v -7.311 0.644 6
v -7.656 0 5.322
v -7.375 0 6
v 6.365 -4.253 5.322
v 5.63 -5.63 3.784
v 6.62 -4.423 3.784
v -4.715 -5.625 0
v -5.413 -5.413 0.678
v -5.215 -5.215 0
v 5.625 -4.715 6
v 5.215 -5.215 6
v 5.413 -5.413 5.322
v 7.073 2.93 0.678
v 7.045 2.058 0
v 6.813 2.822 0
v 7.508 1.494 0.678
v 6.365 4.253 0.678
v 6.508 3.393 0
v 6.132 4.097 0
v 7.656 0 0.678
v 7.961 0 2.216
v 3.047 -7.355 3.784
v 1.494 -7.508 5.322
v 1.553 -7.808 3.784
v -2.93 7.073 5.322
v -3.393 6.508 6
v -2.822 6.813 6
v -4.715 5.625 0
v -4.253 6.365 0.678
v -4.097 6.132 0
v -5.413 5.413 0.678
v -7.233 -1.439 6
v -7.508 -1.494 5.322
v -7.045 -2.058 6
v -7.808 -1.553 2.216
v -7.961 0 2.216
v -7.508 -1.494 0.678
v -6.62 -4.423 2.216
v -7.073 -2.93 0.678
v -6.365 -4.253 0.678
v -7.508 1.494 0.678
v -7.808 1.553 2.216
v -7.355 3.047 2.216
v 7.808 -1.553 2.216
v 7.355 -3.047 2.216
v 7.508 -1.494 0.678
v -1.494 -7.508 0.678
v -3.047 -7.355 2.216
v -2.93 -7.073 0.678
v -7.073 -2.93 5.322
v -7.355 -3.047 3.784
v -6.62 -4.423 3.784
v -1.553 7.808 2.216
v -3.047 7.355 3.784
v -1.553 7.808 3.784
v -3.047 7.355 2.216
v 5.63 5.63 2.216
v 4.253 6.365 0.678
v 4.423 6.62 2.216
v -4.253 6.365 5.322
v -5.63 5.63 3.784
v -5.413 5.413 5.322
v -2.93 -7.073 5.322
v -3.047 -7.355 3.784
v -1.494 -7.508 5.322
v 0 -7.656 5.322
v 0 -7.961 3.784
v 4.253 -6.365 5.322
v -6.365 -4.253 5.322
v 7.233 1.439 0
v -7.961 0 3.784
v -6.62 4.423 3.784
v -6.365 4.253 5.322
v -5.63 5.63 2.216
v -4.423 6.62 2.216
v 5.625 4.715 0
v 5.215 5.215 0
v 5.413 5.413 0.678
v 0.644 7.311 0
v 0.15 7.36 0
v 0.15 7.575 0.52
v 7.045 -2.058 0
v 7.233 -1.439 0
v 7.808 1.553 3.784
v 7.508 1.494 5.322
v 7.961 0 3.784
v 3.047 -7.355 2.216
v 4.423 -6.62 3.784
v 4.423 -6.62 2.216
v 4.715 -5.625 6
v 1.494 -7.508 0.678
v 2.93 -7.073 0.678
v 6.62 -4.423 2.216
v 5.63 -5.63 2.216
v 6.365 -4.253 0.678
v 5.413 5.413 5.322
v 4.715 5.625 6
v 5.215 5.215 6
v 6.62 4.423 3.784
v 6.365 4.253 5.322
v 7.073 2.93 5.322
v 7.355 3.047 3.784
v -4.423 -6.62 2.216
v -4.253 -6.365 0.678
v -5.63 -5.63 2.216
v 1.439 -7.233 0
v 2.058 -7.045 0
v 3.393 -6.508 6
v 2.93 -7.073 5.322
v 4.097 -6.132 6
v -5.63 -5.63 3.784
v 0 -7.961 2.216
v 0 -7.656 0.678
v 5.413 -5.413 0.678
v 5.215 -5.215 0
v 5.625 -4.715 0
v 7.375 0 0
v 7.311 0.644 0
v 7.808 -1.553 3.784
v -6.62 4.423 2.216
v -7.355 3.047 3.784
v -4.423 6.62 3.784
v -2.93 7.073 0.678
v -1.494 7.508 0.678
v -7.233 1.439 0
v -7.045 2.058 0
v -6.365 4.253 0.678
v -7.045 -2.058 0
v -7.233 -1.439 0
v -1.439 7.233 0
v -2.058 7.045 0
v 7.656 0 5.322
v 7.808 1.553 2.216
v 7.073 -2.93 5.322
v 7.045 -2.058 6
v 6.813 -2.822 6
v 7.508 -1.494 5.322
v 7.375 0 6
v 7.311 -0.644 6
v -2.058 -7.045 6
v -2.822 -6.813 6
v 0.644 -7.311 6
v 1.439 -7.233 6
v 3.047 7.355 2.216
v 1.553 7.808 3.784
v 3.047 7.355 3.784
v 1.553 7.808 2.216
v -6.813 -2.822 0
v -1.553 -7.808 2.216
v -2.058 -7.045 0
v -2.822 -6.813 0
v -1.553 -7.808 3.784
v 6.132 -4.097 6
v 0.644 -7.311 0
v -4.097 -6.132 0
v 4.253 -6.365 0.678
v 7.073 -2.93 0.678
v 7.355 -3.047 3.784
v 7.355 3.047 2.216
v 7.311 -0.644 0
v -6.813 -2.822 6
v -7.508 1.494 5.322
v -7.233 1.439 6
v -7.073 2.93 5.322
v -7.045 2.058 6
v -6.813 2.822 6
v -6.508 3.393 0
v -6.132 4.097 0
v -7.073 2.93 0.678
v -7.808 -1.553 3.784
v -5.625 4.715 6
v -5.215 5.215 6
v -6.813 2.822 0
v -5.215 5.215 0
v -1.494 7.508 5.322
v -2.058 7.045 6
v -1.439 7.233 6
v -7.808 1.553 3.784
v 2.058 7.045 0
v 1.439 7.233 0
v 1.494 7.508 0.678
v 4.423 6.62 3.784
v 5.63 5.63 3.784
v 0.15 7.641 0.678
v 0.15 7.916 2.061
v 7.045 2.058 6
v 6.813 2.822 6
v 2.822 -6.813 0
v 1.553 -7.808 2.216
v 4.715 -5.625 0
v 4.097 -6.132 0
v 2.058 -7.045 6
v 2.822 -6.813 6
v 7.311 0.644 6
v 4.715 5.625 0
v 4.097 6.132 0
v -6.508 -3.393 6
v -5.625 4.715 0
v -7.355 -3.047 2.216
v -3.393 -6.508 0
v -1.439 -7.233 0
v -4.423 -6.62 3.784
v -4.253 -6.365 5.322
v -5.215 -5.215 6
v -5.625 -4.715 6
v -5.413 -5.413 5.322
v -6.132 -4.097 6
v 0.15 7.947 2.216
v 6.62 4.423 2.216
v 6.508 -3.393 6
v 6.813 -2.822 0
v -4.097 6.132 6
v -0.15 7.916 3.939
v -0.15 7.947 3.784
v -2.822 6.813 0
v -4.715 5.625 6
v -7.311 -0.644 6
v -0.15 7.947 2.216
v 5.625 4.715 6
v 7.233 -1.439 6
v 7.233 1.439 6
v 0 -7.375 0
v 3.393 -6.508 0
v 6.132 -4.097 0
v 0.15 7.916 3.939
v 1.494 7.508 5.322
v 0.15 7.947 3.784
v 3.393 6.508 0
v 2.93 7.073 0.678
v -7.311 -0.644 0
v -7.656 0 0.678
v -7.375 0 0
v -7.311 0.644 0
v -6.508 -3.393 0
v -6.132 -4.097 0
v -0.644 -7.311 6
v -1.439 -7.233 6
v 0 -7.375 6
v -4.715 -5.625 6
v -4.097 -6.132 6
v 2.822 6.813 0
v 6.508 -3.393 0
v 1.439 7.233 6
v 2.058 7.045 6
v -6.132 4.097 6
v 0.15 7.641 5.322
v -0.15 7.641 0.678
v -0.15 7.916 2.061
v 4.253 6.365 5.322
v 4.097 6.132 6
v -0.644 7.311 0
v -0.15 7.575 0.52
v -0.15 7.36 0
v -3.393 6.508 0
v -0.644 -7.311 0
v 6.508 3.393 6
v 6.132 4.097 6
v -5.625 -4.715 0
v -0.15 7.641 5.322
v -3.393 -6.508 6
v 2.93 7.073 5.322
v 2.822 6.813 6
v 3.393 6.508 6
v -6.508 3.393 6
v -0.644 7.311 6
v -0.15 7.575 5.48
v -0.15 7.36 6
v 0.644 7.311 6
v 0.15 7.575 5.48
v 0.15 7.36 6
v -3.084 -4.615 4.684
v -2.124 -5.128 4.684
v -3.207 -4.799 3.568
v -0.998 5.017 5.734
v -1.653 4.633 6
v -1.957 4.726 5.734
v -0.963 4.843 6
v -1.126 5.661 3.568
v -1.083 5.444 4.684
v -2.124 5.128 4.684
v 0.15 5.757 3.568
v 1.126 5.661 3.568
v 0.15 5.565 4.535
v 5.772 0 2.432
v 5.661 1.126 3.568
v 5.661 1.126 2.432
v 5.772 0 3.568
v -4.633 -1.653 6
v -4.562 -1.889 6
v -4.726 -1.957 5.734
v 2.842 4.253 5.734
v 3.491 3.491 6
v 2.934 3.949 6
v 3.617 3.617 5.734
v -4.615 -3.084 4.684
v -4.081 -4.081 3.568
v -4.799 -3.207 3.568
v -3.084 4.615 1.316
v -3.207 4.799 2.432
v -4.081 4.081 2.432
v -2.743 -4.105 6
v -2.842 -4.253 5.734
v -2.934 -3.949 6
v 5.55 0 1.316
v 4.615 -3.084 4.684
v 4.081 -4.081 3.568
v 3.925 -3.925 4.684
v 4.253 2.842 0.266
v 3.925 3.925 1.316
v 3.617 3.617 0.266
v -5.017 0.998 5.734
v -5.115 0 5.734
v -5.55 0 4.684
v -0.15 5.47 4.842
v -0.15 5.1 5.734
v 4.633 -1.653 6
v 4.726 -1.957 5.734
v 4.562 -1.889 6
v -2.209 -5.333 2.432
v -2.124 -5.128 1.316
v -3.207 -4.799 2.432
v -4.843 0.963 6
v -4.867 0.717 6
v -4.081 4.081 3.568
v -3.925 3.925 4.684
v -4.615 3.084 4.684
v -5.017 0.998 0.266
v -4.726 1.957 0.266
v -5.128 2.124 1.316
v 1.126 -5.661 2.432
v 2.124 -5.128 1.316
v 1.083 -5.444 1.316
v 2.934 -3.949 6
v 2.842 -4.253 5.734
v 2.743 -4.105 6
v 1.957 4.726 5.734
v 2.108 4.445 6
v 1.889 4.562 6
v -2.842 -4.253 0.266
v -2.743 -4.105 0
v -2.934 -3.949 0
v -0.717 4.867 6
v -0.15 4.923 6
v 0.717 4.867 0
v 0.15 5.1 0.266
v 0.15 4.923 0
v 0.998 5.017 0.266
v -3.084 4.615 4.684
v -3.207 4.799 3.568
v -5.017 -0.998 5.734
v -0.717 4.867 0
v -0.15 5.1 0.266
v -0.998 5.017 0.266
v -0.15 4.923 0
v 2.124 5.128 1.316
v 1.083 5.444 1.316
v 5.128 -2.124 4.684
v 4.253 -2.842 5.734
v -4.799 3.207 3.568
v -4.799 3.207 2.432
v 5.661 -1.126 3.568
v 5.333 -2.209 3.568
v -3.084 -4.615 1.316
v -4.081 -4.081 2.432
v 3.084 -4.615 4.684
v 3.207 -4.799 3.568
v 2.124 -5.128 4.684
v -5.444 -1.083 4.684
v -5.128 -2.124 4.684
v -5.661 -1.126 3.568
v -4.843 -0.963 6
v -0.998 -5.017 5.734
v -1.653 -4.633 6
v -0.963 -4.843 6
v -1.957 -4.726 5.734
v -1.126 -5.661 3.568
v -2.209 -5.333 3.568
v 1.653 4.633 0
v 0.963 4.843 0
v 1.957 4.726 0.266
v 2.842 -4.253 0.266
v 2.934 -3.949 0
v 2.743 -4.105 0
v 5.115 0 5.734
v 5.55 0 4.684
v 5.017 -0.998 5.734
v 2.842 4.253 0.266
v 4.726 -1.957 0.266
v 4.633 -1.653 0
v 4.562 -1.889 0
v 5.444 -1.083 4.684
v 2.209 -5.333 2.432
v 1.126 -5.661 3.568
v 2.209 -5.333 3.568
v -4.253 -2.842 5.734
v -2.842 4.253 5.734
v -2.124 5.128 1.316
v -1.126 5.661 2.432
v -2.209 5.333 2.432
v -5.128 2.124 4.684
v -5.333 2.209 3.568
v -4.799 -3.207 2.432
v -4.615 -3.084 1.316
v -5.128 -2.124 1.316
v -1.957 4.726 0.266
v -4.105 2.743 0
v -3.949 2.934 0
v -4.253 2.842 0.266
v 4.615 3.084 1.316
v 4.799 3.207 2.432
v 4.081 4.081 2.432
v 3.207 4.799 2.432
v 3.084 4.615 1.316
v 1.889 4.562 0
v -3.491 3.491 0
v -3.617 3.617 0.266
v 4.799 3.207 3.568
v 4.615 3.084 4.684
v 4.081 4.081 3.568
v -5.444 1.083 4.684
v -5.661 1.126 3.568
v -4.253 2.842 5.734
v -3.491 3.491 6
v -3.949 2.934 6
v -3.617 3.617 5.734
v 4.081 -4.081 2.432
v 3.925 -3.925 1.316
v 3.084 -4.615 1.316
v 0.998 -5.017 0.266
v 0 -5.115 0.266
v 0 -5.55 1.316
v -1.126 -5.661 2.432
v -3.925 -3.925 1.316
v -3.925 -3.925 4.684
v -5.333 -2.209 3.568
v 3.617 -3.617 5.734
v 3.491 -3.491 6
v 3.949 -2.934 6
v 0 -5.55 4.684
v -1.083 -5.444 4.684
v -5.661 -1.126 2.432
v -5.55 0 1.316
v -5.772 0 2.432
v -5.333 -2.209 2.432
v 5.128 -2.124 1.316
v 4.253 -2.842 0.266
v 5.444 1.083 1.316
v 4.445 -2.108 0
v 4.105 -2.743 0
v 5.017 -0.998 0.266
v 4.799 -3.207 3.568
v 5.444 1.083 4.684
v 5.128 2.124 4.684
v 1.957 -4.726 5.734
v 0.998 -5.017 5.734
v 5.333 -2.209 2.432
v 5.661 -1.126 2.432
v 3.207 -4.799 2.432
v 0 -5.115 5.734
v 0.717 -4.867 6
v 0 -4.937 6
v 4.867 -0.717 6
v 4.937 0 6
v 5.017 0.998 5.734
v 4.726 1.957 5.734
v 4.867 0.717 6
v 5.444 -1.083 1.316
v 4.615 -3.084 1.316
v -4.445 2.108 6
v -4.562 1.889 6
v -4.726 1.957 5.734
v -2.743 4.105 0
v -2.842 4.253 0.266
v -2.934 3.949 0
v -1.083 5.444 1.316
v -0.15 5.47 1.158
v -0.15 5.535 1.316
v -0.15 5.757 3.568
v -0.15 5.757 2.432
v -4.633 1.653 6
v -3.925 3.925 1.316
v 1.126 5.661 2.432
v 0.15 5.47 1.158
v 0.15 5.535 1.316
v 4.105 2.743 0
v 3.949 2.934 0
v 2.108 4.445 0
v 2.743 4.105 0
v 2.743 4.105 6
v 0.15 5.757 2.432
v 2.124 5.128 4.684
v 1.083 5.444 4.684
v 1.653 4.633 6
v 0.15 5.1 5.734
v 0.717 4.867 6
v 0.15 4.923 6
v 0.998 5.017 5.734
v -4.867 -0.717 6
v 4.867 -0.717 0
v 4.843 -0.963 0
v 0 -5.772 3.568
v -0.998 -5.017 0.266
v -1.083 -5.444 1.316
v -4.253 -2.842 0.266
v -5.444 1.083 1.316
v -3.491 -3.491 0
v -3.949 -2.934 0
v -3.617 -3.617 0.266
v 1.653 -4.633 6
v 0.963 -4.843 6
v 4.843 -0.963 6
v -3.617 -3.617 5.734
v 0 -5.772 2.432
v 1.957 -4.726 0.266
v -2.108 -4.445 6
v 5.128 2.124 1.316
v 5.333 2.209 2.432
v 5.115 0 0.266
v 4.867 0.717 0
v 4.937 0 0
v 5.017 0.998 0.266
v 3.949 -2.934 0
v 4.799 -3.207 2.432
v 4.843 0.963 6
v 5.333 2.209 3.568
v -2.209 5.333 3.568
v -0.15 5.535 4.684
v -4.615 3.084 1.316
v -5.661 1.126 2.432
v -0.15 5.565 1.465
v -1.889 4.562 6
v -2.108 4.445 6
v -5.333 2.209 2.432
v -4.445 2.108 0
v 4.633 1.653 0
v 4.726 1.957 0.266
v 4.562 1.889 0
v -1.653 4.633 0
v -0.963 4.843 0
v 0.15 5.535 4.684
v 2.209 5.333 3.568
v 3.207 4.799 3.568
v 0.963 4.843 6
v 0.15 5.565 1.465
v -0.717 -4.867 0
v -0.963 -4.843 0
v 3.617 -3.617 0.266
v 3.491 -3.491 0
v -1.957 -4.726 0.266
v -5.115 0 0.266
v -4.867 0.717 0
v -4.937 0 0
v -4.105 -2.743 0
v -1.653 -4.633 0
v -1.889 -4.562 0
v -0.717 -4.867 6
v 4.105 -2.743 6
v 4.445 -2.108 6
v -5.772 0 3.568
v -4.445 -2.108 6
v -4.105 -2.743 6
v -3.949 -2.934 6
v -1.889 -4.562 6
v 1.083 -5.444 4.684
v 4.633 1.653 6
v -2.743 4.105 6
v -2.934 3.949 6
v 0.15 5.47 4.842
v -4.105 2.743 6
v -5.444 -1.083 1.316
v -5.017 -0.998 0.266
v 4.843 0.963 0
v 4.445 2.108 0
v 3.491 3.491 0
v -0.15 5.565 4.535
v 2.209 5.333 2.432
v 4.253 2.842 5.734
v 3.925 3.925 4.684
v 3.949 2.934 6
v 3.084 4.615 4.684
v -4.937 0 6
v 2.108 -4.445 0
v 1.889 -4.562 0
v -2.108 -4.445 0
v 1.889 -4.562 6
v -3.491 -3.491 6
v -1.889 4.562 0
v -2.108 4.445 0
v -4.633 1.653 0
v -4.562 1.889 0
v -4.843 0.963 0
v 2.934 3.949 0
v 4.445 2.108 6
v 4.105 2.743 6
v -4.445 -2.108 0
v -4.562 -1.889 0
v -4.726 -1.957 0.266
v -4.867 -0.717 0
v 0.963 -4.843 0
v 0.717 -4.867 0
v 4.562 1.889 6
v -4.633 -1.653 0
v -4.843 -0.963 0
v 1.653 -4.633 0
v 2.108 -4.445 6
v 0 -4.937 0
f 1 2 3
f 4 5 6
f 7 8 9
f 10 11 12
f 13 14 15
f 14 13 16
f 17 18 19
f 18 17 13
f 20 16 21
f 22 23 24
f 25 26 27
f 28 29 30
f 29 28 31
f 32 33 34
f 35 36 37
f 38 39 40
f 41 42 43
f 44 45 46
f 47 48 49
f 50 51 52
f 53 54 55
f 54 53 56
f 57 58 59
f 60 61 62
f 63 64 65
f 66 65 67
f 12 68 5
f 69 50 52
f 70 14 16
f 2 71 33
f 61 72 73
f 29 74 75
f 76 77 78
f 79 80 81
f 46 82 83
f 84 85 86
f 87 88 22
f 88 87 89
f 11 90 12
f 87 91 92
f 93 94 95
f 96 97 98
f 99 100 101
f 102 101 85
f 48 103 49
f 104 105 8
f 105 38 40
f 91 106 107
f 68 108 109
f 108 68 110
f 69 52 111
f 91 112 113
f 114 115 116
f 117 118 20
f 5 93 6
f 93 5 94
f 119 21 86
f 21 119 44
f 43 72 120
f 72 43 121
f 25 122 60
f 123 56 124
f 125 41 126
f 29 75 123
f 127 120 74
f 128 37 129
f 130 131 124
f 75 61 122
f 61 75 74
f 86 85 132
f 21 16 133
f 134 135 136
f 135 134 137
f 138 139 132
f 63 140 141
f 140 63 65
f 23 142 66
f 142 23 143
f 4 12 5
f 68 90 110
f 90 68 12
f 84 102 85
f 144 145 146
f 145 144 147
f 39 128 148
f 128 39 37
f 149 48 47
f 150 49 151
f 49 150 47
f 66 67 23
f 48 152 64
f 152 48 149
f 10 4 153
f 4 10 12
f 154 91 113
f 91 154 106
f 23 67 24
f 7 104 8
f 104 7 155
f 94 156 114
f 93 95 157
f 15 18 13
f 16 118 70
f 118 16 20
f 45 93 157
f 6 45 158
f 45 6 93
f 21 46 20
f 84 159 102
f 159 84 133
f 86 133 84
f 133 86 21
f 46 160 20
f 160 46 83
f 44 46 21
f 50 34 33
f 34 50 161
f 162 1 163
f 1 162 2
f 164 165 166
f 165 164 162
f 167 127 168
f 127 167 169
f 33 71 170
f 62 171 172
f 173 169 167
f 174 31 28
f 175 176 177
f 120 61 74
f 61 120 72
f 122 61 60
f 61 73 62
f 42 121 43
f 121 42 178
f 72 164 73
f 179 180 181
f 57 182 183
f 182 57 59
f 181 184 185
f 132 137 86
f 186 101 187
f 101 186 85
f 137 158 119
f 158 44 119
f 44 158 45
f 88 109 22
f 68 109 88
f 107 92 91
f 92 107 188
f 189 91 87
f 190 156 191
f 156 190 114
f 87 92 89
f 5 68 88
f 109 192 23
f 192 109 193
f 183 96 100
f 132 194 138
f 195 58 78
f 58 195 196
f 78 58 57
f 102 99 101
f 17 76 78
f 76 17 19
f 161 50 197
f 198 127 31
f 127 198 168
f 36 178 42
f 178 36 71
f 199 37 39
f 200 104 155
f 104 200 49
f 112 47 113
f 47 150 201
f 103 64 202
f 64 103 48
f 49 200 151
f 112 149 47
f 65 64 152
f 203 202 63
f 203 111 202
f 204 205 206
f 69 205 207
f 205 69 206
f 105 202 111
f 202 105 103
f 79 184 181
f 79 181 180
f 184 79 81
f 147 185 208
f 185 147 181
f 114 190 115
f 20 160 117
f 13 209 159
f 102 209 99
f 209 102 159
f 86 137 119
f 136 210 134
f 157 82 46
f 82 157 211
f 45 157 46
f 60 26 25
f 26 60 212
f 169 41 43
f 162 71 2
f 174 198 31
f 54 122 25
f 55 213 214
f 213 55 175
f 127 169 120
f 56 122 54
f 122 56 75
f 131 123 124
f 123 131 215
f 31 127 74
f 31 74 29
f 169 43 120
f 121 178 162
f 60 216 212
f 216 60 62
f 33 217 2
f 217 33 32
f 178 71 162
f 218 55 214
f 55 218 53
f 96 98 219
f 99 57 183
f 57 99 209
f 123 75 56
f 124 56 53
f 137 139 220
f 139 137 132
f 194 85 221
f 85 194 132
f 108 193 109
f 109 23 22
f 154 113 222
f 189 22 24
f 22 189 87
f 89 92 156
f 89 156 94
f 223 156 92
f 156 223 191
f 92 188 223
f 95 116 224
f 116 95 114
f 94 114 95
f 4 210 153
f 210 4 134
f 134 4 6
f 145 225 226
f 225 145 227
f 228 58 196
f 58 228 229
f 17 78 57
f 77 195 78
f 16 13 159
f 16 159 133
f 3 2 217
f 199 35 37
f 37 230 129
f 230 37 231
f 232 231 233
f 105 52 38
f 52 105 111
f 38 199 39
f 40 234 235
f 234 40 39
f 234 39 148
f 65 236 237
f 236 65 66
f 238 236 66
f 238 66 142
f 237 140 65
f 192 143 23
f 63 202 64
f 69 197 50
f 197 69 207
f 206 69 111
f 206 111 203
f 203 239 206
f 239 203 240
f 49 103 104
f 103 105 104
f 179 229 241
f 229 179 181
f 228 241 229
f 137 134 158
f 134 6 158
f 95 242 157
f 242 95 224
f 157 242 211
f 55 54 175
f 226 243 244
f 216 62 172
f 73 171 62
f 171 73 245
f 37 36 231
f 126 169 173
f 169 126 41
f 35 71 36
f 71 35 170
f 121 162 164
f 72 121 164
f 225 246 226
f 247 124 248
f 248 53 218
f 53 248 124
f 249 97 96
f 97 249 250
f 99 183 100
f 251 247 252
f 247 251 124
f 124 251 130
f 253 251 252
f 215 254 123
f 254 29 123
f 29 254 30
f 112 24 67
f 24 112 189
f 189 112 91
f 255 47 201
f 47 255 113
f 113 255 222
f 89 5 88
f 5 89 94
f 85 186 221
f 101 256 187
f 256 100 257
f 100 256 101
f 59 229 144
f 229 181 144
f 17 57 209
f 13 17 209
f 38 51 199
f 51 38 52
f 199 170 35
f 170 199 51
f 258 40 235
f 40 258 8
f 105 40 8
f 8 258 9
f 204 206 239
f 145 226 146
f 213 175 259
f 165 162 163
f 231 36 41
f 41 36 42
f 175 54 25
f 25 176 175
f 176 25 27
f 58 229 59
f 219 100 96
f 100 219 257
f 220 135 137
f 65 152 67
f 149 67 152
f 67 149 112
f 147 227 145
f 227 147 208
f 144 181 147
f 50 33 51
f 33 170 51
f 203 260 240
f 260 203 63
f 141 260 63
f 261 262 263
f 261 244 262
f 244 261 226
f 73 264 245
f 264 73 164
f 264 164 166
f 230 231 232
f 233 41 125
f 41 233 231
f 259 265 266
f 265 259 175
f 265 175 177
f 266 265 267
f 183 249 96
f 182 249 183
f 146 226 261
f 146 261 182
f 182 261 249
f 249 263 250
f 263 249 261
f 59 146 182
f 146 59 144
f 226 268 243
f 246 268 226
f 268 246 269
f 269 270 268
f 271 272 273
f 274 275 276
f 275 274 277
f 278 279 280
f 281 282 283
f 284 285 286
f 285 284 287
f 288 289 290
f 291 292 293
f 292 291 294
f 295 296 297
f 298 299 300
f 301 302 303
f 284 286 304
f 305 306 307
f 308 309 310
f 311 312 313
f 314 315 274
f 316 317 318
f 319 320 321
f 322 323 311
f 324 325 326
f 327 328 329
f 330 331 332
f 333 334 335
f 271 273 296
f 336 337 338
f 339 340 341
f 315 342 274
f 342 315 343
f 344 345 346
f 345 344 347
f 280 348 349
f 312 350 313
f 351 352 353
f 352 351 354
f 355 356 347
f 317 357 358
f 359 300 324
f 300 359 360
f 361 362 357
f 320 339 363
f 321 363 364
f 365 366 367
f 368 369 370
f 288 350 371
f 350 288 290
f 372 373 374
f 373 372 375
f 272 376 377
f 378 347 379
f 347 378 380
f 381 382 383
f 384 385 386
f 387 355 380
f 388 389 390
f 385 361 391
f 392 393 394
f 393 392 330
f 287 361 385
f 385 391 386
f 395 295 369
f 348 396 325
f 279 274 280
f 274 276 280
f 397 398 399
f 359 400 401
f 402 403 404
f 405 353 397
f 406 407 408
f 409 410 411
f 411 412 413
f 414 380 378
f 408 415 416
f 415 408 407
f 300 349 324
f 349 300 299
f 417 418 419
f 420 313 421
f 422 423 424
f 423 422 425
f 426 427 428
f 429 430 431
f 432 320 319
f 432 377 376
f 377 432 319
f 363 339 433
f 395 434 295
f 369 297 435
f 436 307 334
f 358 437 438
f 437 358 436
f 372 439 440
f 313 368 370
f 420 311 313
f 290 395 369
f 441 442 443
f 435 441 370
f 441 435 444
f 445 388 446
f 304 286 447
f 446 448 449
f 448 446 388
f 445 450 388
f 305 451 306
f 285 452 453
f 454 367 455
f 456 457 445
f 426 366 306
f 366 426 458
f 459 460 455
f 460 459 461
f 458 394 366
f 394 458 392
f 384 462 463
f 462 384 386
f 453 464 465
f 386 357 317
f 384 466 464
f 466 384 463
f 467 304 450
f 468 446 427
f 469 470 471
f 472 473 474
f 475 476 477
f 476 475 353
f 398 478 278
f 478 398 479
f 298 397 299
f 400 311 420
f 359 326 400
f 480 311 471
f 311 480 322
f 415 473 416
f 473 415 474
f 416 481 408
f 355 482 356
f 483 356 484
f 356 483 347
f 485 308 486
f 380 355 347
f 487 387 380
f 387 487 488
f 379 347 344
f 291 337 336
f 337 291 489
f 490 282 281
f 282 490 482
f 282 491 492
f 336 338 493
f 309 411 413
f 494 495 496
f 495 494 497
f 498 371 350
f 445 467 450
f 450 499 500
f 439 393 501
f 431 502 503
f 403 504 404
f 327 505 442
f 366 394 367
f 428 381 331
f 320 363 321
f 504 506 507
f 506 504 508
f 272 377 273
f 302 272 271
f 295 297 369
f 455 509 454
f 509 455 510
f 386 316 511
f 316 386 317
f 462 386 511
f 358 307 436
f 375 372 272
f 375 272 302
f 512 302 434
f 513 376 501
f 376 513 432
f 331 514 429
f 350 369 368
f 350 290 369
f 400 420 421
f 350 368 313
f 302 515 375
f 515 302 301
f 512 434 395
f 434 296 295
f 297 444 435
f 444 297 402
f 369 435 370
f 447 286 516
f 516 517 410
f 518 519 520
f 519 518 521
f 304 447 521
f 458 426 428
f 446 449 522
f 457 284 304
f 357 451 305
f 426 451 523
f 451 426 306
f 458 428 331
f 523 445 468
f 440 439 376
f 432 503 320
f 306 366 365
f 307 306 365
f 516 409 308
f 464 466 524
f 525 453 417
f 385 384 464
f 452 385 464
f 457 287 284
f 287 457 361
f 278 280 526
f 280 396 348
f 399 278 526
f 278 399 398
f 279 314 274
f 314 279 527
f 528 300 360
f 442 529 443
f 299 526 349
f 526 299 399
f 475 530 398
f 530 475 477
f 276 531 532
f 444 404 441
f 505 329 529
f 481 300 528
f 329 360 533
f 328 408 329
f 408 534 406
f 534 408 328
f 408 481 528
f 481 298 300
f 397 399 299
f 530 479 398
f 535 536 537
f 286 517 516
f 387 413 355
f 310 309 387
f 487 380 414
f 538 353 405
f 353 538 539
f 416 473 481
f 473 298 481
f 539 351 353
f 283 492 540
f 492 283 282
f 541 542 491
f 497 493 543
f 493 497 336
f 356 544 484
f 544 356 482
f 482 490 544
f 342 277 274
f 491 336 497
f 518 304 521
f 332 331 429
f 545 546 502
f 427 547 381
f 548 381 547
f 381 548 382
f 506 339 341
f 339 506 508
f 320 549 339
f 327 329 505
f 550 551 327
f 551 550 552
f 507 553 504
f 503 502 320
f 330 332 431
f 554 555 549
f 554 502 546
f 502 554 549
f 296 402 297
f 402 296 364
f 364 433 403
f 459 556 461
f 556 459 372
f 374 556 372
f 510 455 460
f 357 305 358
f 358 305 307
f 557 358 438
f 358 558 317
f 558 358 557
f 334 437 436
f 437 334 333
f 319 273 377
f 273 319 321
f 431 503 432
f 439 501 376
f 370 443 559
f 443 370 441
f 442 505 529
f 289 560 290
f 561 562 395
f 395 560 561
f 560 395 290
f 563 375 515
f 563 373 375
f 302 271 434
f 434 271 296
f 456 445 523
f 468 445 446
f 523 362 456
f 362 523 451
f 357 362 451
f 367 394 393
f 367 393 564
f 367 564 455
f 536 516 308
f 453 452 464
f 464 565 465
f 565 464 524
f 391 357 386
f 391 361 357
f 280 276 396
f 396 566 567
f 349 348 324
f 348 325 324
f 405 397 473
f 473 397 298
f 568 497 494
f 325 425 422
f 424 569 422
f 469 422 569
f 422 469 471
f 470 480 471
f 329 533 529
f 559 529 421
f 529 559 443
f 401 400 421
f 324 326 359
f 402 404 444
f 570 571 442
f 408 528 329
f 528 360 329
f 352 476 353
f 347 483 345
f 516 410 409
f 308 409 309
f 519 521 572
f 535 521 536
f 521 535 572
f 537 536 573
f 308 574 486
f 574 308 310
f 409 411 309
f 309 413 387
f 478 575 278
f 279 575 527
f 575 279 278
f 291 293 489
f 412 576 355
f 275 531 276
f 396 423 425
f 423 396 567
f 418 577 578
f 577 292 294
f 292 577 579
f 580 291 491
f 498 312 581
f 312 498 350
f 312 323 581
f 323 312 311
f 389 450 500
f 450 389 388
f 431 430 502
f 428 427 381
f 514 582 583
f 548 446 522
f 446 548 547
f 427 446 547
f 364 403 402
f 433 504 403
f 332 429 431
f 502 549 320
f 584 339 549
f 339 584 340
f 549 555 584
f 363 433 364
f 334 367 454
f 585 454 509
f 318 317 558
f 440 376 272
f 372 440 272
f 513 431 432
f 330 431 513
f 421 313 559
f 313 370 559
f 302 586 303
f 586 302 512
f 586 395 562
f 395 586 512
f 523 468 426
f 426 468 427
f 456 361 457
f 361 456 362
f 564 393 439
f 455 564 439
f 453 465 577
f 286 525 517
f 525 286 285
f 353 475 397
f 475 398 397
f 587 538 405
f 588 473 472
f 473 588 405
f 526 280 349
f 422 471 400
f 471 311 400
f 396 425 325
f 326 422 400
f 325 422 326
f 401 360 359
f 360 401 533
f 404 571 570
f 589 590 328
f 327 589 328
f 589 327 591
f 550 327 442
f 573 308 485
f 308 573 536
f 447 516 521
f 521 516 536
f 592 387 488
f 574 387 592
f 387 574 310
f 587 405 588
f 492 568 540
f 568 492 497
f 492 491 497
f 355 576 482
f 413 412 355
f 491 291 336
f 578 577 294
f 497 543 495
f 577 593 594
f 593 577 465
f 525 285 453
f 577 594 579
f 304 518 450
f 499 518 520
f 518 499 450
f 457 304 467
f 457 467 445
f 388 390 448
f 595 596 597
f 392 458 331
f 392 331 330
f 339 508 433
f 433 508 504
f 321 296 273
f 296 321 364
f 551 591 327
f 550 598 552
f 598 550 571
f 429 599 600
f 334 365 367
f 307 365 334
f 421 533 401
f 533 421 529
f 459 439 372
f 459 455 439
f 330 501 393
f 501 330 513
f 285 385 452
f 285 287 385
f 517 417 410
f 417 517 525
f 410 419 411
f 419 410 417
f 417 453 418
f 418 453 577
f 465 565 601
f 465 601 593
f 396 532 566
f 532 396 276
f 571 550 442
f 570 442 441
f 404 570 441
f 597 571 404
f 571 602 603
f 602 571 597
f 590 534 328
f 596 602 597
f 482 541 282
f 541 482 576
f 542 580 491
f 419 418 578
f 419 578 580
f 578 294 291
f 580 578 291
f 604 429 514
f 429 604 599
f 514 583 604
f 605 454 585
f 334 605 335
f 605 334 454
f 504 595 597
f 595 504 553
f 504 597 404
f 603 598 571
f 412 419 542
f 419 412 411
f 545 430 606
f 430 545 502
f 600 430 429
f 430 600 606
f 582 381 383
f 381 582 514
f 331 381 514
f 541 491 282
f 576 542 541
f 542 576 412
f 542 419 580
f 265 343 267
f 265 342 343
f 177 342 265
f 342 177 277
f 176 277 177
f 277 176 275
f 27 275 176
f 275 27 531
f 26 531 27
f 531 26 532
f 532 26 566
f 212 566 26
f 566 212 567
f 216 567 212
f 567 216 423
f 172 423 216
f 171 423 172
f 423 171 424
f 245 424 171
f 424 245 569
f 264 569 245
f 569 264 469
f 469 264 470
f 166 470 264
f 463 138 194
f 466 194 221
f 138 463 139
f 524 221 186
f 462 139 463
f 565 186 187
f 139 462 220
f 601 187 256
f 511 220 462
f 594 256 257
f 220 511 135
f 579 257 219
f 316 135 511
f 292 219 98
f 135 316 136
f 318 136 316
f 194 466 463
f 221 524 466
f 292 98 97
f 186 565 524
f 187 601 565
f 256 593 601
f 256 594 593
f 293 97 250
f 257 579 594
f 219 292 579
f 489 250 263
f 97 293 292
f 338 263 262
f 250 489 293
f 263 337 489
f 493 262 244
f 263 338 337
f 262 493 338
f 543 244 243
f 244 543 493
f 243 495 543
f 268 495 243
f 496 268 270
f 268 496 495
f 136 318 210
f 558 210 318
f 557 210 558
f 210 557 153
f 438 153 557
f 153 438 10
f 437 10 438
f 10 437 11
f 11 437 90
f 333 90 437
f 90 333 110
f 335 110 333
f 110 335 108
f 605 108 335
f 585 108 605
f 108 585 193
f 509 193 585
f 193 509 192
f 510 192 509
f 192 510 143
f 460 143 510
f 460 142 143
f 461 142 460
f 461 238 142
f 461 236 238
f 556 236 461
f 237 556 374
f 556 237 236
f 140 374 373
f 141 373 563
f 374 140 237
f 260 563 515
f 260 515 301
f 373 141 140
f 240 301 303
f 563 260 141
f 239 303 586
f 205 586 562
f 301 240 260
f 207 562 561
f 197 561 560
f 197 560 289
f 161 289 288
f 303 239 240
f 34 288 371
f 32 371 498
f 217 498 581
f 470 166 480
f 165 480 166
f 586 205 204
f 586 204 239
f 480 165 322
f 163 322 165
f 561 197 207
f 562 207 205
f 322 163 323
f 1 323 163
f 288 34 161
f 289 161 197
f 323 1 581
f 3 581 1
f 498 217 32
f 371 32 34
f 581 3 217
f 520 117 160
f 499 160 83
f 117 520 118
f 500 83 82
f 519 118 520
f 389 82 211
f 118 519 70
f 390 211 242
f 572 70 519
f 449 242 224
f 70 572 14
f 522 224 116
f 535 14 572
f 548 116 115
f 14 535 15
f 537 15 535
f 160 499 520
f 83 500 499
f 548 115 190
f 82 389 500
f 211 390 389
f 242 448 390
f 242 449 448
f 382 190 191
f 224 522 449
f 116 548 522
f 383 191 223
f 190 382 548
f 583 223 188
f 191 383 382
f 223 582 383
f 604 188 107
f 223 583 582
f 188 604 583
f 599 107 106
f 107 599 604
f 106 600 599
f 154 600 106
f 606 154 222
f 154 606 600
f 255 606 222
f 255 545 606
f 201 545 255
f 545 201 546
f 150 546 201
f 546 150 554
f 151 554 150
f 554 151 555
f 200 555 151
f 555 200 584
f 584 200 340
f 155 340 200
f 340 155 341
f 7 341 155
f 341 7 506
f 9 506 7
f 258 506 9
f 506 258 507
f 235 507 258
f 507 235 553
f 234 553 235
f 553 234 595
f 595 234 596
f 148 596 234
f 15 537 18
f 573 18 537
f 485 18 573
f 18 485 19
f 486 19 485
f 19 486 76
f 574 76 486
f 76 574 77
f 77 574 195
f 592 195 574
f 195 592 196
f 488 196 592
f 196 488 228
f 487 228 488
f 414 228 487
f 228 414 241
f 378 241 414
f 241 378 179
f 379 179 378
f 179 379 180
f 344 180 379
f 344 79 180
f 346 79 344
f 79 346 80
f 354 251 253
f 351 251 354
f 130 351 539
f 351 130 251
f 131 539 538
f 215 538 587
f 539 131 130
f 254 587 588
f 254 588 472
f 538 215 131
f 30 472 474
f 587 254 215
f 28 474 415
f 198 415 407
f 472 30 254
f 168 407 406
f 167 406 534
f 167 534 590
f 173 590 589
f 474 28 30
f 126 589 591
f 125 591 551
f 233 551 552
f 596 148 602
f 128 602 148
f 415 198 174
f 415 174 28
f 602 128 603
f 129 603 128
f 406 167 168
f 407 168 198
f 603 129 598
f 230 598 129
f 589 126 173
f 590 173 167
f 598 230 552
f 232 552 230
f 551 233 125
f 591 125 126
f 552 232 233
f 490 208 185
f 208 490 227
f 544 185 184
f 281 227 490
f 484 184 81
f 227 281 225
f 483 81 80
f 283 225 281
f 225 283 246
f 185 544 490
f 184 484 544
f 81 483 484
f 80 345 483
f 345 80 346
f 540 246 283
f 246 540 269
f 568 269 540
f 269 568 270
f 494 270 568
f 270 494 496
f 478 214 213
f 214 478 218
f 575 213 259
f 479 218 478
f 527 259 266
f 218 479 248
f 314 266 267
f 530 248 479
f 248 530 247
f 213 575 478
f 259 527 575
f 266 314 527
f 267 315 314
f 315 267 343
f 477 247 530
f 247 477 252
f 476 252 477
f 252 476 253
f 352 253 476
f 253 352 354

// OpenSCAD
//Adjust these to fit, you may want to leave them a little loose

// Inner Radius
inrad=5.8; 

// Outer Radius
outrad=8.0; 

//Overall Height
height=6;  

// Width of the Slit
slit=0.3;  




// This should be automatic:

$fn=32;
box=(outrad*2)+5;

translate([0,0,(height/2)]){
difference(){
    union(){
        difference(){
            difference(){
                difference(){
                    sphere(outrad);
                    sphere(inrad);
                    };
                    translate([-outrad,-outrad,(height/2)]){
                        cube(box);
                        };
                    };
                    translate([-outrad,-outrad,-(box+(height/2))]){
                        cube(box);
                        };
                    };
                };
            translate([-(slit/2),0,-height]){
                cube([slit,box,box]);
                };
            };
    };
